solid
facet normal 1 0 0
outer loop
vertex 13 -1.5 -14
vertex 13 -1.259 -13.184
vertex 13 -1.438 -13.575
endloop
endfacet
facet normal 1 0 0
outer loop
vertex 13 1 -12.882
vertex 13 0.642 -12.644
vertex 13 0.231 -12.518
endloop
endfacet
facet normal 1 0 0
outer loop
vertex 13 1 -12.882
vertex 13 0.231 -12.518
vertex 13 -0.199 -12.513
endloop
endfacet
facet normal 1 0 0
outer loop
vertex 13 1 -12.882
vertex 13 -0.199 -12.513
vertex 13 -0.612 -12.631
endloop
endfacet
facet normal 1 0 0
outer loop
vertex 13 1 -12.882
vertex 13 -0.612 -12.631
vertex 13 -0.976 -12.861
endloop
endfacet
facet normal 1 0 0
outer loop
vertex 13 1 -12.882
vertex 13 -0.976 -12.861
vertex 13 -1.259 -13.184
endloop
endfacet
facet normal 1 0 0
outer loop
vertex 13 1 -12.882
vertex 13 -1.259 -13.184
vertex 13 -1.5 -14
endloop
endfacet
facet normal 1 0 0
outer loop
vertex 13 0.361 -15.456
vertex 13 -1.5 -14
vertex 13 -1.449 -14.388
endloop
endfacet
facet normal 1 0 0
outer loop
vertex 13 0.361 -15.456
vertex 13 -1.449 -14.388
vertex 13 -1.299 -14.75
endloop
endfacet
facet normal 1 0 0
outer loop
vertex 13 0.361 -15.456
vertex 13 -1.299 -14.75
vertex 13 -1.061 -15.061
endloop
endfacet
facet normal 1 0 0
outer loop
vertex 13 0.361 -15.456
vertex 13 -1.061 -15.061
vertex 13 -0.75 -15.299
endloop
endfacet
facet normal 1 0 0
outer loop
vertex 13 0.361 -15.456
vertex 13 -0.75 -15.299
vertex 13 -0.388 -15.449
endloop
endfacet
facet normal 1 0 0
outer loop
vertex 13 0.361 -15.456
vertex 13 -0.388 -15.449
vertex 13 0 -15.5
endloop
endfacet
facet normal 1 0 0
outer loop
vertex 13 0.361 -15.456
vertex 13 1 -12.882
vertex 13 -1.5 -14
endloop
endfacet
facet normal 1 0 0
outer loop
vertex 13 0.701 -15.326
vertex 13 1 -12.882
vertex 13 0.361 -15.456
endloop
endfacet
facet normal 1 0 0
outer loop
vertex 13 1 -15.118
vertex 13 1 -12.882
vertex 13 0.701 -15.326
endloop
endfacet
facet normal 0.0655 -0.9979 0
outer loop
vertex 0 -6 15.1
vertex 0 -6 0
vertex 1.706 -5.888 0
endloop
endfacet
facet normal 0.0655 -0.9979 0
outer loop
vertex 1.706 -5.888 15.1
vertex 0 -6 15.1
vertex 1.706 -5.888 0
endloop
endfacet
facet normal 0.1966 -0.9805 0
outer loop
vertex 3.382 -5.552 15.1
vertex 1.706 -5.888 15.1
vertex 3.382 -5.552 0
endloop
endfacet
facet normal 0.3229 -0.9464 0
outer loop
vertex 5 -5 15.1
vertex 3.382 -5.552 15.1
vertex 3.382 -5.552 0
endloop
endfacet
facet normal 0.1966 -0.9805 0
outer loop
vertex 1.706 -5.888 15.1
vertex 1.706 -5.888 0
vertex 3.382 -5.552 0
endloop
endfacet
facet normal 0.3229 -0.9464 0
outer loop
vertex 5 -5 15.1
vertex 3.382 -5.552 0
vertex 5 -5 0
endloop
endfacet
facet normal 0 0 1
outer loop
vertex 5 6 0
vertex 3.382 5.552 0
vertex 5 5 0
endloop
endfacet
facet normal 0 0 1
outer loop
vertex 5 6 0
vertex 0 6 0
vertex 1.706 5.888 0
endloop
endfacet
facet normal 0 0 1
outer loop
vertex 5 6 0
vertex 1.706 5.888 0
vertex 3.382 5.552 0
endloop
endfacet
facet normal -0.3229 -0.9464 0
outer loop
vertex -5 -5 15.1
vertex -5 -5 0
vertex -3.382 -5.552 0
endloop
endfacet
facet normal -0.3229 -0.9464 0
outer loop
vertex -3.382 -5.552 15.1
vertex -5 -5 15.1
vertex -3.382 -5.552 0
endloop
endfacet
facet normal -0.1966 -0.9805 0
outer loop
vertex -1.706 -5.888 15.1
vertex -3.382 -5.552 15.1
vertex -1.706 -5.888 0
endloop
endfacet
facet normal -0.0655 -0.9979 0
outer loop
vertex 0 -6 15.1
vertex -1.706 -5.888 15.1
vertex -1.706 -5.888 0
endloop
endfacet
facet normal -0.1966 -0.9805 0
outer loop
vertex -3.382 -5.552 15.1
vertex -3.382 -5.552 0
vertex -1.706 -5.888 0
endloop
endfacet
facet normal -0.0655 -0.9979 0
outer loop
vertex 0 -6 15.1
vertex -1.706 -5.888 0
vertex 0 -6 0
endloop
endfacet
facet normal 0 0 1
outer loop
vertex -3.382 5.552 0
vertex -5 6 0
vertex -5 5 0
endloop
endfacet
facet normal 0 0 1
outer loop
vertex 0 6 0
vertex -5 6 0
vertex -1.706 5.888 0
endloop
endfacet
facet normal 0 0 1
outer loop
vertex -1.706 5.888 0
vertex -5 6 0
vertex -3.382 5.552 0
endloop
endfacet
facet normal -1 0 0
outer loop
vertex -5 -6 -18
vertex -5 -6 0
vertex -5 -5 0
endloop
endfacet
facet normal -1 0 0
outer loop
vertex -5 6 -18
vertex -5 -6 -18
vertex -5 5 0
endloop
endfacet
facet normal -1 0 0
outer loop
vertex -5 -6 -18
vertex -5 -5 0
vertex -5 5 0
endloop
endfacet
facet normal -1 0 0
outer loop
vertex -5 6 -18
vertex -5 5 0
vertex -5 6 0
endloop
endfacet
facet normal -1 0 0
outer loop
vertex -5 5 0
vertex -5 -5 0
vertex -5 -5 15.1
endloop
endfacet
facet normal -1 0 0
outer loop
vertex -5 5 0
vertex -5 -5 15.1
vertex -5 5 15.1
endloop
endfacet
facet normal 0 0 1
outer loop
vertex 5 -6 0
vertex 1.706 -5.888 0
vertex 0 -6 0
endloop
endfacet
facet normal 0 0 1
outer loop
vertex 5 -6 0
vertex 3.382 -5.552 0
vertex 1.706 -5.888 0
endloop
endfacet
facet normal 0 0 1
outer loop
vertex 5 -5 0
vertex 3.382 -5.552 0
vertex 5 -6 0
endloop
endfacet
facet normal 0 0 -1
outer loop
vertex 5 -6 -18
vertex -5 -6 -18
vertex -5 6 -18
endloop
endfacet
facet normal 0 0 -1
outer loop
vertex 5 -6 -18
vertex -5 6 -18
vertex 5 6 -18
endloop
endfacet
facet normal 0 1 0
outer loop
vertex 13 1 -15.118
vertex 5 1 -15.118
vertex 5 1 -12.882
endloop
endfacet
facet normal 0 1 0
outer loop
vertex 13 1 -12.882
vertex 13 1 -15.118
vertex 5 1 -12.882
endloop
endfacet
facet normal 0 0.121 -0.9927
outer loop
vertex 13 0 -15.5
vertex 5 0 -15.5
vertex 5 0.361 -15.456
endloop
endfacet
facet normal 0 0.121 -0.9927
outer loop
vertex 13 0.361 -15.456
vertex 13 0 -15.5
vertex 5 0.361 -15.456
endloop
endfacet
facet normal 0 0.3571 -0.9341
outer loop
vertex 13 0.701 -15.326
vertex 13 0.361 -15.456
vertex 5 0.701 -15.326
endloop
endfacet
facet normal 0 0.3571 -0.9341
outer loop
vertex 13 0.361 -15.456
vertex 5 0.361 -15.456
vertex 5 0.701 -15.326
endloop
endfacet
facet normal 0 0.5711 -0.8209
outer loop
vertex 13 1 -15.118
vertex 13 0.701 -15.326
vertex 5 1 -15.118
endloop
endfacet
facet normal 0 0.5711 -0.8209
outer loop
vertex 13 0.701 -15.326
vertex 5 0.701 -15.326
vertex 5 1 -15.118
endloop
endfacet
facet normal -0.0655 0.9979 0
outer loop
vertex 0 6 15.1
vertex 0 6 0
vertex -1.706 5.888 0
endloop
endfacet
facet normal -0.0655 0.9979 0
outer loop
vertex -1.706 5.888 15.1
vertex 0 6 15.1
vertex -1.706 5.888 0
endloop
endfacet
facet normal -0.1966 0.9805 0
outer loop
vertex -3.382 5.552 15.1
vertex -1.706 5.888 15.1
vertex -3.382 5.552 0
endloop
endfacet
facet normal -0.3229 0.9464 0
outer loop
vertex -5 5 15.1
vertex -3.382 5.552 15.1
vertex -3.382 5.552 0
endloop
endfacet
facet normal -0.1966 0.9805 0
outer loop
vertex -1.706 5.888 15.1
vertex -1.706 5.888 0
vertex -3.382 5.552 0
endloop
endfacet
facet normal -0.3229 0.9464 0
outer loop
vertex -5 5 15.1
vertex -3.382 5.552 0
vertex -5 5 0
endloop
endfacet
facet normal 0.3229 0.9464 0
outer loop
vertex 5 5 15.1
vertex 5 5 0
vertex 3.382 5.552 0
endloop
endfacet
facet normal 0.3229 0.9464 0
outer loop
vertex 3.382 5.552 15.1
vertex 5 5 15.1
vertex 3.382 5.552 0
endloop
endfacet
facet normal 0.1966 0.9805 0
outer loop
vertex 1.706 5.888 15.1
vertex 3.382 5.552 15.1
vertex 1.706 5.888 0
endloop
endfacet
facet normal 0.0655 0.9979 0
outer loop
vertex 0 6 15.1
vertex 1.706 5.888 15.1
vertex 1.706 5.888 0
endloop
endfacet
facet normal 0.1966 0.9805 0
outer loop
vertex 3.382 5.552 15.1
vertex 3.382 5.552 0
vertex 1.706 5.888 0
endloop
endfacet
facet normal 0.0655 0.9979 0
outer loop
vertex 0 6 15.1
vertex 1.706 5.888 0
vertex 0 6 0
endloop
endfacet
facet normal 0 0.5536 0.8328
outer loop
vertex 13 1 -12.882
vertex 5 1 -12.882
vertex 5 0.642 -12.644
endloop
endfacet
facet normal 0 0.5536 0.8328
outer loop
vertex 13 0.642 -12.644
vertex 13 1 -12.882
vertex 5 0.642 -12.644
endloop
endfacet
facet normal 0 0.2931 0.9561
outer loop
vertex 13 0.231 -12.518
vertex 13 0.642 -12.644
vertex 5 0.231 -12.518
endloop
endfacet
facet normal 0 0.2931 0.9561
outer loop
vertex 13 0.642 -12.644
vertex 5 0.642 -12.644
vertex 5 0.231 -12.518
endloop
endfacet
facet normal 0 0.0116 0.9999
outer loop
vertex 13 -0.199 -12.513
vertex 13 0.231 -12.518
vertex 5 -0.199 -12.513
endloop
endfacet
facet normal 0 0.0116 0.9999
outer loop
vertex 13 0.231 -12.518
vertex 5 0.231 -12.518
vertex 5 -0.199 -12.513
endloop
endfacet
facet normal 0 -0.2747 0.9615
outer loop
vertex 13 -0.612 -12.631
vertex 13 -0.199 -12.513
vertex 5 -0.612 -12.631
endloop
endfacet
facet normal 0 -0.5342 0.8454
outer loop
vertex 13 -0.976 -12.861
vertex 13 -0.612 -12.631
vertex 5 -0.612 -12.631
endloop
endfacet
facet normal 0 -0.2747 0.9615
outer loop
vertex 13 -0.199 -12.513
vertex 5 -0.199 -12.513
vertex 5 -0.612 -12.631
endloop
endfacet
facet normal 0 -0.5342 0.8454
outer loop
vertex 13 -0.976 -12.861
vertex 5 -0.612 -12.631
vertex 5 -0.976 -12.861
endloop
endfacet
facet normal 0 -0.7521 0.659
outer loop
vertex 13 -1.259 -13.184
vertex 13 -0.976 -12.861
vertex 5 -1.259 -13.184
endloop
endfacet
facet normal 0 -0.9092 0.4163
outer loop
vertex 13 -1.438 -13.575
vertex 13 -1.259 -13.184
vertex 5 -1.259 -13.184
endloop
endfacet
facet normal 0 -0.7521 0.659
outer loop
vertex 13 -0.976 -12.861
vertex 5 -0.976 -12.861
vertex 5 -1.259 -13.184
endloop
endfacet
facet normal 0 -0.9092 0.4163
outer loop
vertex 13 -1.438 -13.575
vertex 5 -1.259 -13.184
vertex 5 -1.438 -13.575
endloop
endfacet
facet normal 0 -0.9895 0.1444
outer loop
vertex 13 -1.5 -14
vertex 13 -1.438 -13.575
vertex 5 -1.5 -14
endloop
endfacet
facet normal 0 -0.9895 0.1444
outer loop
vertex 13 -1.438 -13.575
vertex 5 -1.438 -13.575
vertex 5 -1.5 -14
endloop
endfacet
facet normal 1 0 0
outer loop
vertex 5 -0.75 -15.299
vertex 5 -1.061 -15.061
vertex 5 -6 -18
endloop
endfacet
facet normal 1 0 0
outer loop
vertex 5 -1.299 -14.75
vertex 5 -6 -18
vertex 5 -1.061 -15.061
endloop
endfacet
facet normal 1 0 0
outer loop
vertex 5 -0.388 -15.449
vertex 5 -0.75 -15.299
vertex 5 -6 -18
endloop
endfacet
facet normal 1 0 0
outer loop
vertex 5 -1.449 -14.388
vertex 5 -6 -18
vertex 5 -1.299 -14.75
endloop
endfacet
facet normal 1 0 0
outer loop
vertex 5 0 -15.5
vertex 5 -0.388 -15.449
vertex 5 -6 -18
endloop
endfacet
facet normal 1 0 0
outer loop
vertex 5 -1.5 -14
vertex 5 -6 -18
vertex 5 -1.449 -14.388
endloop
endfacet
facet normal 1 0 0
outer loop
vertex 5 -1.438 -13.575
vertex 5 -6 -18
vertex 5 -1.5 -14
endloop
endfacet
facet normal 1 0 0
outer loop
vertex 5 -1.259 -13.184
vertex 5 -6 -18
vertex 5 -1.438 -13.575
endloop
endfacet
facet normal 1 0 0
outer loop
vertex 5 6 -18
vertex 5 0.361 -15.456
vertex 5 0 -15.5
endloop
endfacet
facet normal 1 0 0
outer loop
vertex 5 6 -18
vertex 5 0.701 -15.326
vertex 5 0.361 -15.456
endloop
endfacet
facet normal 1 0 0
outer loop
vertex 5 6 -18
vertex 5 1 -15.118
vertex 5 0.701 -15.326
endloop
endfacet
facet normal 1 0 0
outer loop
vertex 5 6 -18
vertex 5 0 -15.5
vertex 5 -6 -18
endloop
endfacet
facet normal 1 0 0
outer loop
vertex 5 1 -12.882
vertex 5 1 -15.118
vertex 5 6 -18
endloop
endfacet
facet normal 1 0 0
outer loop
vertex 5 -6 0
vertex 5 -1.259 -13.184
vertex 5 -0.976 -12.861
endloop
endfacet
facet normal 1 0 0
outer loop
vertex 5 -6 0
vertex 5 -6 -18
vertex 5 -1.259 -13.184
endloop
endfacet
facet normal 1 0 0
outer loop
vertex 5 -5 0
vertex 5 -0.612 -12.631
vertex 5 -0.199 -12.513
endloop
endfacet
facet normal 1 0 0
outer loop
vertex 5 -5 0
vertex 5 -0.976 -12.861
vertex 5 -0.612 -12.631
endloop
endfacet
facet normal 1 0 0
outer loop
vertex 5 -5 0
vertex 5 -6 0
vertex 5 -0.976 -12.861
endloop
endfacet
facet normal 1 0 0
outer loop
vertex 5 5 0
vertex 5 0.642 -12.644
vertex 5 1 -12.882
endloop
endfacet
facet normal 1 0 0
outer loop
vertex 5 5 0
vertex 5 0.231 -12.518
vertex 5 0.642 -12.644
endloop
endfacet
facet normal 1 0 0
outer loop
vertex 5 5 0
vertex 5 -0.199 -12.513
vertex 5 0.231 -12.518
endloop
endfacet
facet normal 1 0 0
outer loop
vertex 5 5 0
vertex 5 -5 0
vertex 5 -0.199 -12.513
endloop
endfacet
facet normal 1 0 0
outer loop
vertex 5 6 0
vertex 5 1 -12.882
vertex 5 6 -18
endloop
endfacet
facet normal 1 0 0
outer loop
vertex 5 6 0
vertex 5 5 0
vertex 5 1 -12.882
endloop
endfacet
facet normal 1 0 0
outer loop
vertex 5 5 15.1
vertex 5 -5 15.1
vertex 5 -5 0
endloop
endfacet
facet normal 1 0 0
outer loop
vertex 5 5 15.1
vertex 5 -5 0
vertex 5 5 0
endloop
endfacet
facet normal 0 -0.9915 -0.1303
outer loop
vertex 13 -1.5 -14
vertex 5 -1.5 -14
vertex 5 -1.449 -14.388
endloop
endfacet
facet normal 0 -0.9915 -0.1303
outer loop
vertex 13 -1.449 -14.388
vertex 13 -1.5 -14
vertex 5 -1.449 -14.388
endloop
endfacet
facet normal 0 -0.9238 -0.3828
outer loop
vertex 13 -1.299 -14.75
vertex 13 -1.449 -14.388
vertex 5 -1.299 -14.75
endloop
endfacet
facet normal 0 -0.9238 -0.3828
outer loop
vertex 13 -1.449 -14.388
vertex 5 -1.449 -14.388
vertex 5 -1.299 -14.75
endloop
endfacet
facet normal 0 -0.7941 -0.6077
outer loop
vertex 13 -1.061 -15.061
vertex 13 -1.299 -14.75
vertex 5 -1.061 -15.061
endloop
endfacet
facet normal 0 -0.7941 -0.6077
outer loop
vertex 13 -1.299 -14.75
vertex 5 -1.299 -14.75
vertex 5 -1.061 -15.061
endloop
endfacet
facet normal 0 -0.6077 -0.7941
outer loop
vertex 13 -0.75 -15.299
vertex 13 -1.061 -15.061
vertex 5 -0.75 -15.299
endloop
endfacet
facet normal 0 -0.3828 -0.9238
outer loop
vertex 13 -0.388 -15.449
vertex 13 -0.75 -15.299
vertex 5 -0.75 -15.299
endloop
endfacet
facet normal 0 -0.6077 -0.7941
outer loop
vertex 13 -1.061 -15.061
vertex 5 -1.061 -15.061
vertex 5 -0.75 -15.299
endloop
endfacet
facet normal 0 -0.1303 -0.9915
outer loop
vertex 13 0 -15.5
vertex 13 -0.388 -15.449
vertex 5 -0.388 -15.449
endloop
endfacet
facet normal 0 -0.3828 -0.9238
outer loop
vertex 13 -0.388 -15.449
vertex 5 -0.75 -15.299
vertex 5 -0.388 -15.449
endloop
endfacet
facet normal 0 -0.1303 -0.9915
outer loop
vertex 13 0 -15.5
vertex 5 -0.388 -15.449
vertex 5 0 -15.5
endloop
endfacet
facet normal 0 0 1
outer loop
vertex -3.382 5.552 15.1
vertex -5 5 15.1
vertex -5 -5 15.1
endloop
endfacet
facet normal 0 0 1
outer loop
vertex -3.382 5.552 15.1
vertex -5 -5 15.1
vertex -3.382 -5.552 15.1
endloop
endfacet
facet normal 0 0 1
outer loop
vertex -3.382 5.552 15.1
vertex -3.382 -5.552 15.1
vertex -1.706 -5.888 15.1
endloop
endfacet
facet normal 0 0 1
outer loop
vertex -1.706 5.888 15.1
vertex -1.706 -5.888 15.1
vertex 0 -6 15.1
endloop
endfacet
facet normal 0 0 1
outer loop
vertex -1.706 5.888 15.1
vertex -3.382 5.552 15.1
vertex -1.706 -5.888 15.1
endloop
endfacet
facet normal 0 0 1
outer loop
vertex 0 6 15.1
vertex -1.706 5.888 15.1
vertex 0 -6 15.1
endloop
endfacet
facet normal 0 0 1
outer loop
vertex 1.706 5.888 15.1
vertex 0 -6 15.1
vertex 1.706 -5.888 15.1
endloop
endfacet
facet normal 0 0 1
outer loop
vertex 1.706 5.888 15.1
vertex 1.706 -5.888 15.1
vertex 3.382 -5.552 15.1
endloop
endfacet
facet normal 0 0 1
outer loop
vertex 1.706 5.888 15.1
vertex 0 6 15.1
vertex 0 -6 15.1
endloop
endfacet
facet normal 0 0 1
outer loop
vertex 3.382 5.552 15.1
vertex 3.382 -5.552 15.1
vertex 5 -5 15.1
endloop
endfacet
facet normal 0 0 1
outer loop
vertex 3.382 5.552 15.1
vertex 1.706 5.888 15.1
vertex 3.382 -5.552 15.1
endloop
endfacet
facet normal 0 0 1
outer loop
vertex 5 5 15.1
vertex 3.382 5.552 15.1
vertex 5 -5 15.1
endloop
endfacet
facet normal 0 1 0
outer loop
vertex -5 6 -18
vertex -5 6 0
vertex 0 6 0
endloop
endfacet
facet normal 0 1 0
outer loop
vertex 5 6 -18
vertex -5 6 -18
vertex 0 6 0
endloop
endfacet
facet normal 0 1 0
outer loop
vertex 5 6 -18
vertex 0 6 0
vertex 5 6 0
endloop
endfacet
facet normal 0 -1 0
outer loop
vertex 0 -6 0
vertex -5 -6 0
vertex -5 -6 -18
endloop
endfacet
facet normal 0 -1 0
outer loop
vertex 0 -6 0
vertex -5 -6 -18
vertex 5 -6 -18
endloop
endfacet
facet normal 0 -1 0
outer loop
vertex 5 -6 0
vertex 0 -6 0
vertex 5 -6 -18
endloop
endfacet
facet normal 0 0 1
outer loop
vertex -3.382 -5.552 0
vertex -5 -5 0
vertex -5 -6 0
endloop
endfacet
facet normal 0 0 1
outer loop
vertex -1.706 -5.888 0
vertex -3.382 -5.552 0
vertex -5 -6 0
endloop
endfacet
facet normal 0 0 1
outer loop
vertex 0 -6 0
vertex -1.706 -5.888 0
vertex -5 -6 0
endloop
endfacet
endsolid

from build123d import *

# Parameters (mm, degrees)
SKETCH1_W           = 5
SKETCH1_H           = 10
BOSS_EXTRUDE1_DEPTH = 15.1
SKETCH2_W           = 10
SKETCH2_H           = 12
BOSS_EXTRUDE2_DEPTH = 18
BOSS_EXTRUDE3_DEPTH = 8


with BuildPart() as part:
    # Sketch1 → Boss-Extrude1 (new body)
    with BuildSketch(Plane.XY):
        with Locations((-2.5, 0)):
            Rectangle(SKETCH1_W, SKETCH1_H)
        with Locations((2.5, 0)):
            Rectangle(SKETCH1_W, SKETCH1_H)
        with BuildLine():
            Line((0, 6), (0, 5))
            Line((0, 5), (5, 5))
            ThreePointArc((5, 5), (2.549509757, 5.747548784), (0, 6))
        make_face()
        with BuildLine():
            Line((-5, 5), (0, 5))
            Line((0, 5), (0, 6))
            ThreePointArc((0, 6), (-2.549509757, 5.747548784), (-5, 5))
        make_face()
        with BuildLine():
            Line((0, -5), (0, -6))
            ThreePointArc((0, -6), (2.549509757, -5.747548784), (5, -5))
            Line((5, -5), (0, -5))
        make_face()
        with BuildLine():
            ThreePointArc((-5, -5), (-2.549509757, -5.747548784), (0, -6))
            Line((0, -6), (0, -5))
            Line((0, -5), (-5, -5))
        make_face()
    extrude(amount=BOSS_EXTRUDE1_DEPTH)

    # Sketch2 → Boss-Extrude2 (add)
    with BuildSketch(Plane.XY):
        Rectangle(SKETCH2_W, SKETCH2_H)
    extrude(amount=-BOSS_EXTRUDE2_DEPTH)

    # Sketch3 → Boss-Extrude3 (add)
    with BuildSketch(Plane(origin=(5, 0, 0), x_dir=(0, 0, -1), z_dir=(1, 0, 0))):
        with BuildLine():
            Line((14, -1.5), (14, 0))
            Line((14, 0), (14, 1))
            Line((14, 1), (12.881966011, 1))
            ThreePointArc((12.881966011, 1), (12.630693606, -0.612372436), (14, -1.5))
        make_face()
        with BuildLine():
            Line((14, 0), (15.5, 0))
            ThreePointArc((15.5, 0), (15.401258538, 0.535233135), (15.118033989, 1))
            Line((15.118033989, 1), (14, 1))
            Line((14, 1), (14, 0))
        make_face()
        with BuildLine():
            ThreePointArc((14, -1.5), (15.060660172, -1.060660172), (15.5, 0))
            Line((15.5, 0), (14, 0))
            Line((14, 0), (14, -1.5))
        make_face()
    extrude(amount=BOSS_EXTRUDE3_DEPTH)


solid = part.part
